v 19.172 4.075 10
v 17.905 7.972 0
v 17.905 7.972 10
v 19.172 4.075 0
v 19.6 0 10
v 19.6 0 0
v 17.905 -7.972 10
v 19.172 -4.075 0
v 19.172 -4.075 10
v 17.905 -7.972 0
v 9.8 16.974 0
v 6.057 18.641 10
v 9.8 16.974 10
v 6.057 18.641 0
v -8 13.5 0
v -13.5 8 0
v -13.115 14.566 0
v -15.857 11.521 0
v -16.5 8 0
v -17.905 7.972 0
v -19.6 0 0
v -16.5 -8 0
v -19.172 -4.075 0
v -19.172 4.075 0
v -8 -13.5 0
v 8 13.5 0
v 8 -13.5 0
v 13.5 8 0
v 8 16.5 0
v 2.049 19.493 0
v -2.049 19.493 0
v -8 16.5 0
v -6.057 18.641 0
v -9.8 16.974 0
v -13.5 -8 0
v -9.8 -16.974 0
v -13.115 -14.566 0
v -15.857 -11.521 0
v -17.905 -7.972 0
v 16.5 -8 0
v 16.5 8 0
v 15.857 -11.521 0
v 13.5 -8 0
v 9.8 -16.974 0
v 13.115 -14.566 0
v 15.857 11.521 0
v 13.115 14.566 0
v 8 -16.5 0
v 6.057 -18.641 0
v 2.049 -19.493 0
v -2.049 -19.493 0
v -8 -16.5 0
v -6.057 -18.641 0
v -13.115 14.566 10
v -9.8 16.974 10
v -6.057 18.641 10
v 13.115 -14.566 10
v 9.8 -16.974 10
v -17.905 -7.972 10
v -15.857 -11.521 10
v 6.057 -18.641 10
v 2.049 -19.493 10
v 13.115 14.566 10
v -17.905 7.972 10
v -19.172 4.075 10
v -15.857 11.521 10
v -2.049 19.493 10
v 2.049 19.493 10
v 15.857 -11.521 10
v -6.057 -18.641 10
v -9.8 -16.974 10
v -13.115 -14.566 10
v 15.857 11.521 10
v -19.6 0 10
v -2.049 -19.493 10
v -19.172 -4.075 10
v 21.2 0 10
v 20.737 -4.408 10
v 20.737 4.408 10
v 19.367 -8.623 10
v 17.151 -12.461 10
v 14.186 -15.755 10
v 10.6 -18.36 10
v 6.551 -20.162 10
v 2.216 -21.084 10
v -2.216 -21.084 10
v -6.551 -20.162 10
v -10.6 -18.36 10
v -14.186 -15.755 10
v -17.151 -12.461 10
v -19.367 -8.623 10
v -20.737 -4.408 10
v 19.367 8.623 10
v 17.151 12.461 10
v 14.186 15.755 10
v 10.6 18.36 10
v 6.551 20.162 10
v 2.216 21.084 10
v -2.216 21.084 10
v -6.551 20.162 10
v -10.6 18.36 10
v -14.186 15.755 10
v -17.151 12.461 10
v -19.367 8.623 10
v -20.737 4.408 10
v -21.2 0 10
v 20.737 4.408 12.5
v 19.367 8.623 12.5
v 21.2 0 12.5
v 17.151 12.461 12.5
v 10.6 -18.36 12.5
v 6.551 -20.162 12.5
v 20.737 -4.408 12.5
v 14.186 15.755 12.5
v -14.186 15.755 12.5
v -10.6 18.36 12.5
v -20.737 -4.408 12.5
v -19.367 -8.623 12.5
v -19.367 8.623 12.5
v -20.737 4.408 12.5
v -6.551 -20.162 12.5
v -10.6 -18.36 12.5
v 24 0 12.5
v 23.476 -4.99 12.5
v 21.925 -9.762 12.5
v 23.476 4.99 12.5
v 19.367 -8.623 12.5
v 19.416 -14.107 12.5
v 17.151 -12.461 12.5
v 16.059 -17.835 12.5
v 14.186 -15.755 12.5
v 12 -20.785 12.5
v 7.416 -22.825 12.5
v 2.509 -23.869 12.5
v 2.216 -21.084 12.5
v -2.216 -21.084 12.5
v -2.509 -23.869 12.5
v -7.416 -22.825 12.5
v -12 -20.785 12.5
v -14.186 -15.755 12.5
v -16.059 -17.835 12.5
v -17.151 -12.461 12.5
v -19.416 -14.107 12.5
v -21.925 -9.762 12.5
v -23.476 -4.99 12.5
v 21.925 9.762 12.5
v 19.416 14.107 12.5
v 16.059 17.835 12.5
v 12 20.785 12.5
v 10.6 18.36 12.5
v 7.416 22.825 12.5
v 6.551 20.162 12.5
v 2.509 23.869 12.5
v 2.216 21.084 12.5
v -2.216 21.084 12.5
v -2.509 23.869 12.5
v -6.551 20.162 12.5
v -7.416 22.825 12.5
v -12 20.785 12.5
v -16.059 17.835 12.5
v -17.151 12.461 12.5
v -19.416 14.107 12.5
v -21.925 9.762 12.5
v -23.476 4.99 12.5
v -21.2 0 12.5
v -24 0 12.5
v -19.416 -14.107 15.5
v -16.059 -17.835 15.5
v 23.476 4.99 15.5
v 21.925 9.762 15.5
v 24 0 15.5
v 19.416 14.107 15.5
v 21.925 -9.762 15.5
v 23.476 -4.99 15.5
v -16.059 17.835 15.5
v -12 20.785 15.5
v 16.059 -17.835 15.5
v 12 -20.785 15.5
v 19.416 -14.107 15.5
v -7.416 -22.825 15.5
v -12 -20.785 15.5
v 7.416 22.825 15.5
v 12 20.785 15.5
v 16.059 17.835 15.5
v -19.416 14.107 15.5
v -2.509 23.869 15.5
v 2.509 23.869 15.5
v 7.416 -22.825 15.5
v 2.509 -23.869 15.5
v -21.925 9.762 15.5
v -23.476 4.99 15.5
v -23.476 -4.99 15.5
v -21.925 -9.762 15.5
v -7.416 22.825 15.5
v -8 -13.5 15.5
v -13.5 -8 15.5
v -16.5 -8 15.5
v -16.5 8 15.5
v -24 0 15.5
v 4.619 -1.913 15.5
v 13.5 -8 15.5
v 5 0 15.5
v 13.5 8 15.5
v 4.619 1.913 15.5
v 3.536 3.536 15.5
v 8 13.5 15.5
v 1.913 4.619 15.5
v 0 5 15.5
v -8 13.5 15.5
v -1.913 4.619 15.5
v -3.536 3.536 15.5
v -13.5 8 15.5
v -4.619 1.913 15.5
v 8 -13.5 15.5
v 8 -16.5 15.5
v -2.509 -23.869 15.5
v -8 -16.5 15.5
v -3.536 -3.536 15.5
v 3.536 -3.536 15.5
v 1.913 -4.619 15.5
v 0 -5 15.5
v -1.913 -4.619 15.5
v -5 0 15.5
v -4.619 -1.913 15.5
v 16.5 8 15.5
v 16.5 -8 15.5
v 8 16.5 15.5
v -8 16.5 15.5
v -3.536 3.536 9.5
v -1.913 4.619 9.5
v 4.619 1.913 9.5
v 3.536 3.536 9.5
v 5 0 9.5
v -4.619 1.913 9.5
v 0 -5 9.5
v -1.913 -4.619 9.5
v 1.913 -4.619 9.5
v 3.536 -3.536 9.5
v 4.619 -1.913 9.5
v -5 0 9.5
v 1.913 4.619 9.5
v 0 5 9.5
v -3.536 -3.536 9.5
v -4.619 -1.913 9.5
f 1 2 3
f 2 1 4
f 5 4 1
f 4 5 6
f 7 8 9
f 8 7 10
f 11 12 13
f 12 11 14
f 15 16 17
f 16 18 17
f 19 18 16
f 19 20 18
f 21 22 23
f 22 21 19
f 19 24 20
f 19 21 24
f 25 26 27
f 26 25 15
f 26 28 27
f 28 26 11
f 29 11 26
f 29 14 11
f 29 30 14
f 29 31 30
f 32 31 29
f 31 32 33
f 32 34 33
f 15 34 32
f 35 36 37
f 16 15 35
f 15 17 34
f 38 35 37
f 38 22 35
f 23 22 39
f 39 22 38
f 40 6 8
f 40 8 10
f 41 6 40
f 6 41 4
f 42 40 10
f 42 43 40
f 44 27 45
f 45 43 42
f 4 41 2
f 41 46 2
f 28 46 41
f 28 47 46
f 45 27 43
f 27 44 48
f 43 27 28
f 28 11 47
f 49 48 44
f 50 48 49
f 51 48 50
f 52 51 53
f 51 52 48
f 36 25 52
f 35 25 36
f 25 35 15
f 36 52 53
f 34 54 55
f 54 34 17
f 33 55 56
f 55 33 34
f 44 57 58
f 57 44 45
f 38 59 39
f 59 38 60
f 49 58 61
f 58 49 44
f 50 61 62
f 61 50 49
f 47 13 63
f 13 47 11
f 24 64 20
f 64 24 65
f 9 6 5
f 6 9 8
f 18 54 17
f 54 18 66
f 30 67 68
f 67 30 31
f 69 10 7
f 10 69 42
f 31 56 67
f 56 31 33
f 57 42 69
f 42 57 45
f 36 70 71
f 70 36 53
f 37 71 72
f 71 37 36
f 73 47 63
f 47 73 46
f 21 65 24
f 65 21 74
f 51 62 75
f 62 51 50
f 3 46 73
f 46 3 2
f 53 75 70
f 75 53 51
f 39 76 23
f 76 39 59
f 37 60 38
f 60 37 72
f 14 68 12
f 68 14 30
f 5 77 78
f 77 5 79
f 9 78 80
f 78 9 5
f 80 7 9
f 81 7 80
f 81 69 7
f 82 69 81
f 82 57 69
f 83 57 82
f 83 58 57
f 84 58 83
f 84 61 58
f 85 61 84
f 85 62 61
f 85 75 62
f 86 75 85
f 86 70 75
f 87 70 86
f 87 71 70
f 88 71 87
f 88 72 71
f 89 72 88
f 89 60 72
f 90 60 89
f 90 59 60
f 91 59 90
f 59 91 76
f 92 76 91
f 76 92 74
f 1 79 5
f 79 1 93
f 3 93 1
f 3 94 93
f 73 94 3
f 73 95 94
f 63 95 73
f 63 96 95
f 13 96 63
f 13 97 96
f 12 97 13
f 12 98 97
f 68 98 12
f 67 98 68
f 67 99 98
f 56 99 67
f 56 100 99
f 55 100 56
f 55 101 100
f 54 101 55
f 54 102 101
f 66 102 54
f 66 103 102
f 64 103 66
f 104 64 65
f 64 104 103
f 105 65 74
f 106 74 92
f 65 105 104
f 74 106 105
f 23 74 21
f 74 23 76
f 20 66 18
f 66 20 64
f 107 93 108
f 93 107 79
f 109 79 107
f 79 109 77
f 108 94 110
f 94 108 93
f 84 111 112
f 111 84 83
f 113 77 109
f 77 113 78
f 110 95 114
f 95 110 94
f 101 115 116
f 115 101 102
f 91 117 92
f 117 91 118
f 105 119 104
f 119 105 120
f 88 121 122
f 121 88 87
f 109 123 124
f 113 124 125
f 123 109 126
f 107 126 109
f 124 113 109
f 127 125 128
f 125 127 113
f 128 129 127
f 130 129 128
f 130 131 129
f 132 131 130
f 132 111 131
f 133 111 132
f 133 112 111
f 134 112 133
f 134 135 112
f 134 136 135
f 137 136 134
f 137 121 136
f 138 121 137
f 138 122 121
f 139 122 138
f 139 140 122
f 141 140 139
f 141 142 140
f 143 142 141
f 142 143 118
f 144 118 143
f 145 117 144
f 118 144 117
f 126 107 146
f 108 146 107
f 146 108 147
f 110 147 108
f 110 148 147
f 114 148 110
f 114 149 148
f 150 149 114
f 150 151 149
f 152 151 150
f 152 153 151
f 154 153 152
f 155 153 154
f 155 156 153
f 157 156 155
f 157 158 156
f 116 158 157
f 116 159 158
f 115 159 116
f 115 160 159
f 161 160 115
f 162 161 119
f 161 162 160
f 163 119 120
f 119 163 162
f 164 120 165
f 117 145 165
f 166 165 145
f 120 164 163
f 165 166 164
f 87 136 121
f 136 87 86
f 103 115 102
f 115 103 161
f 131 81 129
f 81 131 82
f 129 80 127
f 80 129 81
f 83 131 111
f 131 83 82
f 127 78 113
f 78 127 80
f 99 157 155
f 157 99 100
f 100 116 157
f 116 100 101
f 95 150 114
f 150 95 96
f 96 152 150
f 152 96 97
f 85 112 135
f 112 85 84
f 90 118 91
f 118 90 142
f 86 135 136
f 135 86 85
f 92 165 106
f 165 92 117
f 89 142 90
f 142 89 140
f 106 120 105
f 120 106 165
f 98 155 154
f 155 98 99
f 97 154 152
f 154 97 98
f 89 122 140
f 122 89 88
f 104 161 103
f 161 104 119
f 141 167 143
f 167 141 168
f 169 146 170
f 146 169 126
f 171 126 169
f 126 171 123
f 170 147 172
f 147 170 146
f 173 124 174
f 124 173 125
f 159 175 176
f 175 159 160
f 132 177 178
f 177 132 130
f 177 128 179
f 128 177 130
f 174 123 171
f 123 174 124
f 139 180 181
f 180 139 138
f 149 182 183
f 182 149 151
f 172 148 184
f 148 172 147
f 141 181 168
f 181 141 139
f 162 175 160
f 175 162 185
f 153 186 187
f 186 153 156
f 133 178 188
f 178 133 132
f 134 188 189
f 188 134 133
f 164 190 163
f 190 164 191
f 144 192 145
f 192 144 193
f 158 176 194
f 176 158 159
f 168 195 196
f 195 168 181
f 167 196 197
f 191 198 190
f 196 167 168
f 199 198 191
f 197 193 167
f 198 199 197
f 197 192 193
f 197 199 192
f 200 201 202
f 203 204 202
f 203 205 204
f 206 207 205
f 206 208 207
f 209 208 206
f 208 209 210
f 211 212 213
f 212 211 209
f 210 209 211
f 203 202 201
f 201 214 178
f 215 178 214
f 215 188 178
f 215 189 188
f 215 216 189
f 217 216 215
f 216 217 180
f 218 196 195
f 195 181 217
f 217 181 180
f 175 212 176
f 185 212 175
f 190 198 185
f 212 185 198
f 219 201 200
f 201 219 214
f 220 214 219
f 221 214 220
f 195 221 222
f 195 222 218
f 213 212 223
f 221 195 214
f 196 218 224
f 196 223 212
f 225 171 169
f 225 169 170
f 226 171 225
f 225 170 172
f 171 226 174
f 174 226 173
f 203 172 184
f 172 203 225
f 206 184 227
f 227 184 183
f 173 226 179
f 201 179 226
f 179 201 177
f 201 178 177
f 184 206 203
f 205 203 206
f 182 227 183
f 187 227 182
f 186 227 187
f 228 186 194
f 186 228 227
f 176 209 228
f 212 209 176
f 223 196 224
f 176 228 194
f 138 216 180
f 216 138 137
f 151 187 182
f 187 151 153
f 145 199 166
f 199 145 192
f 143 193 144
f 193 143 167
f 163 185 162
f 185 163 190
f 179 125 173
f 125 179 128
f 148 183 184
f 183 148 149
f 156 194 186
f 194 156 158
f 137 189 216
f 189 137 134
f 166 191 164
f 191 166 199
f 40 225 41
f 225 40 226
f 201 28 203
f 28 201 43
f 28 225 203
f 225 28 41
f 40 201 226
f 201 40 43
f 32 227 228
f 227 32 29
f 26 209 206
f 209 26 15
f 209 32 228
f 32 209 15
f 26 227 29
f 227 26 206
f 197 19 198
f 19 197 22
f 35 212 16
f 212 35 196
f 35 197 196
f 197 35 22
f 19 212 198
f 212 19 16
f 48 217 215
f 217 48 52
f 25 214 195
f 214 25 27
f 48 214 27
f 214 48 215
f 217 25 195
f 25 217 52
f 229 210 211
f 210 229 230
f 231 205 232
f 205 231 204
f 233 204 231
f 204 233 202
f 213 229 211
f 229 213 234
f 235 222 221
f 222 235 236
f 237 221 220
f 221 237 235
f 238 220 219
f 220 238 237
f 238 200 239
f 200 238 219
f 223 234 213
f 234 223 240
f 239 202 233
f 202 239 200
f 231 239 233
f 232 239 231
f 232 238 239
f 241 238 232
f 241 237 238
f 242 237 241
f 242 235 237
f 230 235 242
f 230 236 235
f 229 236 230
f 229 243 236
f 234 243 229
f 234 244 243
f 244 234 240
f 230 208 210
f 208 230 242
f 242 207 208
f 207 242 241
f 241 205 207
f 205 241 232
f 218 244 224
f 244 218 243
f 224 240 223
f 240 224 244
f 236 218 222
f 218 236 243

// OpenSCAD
// Snap-in round hole plug, nominal hole diameter 40 mm

hole_r = 20;
top_r = 24;
lip_r = 21.2;
top_h = 3;
stem_h = 10;
lip_h = 2.5;
slot_w = 3;
slot_d = 16;

module spring_slot() {
    cube([slot_w, slot_d, stem_h * 3], center=true);
}

difference() {
    union() {
        translate([0, 0, stem_h / 2]) {
            cylinder(h=stem_h, r=hole_r - 0.4, center=true);
        }
        translate([0, 0, stem_h + lip_h / 2]) {
            cylinder(h=lip_h, r=lip_r, center=true);
        }
        translate([0, 0, stem_h + lip_h + top_h / 2]) {
            cylinder(h=top_h, r=top_r, center=true);
        }
    }

    for (i = [0 : 3]) {
        rotate([0, 0, i * 90]) {
            translate([hole_r - 5, 0, stem_h / 2]) {
                spring_slot();
            }
        }
    }

    translate([0, 0, stem_h + lip_h + top_h / 2]) {
        cylinder(h=top_h * 3, r=5, center=true);
    }
}
